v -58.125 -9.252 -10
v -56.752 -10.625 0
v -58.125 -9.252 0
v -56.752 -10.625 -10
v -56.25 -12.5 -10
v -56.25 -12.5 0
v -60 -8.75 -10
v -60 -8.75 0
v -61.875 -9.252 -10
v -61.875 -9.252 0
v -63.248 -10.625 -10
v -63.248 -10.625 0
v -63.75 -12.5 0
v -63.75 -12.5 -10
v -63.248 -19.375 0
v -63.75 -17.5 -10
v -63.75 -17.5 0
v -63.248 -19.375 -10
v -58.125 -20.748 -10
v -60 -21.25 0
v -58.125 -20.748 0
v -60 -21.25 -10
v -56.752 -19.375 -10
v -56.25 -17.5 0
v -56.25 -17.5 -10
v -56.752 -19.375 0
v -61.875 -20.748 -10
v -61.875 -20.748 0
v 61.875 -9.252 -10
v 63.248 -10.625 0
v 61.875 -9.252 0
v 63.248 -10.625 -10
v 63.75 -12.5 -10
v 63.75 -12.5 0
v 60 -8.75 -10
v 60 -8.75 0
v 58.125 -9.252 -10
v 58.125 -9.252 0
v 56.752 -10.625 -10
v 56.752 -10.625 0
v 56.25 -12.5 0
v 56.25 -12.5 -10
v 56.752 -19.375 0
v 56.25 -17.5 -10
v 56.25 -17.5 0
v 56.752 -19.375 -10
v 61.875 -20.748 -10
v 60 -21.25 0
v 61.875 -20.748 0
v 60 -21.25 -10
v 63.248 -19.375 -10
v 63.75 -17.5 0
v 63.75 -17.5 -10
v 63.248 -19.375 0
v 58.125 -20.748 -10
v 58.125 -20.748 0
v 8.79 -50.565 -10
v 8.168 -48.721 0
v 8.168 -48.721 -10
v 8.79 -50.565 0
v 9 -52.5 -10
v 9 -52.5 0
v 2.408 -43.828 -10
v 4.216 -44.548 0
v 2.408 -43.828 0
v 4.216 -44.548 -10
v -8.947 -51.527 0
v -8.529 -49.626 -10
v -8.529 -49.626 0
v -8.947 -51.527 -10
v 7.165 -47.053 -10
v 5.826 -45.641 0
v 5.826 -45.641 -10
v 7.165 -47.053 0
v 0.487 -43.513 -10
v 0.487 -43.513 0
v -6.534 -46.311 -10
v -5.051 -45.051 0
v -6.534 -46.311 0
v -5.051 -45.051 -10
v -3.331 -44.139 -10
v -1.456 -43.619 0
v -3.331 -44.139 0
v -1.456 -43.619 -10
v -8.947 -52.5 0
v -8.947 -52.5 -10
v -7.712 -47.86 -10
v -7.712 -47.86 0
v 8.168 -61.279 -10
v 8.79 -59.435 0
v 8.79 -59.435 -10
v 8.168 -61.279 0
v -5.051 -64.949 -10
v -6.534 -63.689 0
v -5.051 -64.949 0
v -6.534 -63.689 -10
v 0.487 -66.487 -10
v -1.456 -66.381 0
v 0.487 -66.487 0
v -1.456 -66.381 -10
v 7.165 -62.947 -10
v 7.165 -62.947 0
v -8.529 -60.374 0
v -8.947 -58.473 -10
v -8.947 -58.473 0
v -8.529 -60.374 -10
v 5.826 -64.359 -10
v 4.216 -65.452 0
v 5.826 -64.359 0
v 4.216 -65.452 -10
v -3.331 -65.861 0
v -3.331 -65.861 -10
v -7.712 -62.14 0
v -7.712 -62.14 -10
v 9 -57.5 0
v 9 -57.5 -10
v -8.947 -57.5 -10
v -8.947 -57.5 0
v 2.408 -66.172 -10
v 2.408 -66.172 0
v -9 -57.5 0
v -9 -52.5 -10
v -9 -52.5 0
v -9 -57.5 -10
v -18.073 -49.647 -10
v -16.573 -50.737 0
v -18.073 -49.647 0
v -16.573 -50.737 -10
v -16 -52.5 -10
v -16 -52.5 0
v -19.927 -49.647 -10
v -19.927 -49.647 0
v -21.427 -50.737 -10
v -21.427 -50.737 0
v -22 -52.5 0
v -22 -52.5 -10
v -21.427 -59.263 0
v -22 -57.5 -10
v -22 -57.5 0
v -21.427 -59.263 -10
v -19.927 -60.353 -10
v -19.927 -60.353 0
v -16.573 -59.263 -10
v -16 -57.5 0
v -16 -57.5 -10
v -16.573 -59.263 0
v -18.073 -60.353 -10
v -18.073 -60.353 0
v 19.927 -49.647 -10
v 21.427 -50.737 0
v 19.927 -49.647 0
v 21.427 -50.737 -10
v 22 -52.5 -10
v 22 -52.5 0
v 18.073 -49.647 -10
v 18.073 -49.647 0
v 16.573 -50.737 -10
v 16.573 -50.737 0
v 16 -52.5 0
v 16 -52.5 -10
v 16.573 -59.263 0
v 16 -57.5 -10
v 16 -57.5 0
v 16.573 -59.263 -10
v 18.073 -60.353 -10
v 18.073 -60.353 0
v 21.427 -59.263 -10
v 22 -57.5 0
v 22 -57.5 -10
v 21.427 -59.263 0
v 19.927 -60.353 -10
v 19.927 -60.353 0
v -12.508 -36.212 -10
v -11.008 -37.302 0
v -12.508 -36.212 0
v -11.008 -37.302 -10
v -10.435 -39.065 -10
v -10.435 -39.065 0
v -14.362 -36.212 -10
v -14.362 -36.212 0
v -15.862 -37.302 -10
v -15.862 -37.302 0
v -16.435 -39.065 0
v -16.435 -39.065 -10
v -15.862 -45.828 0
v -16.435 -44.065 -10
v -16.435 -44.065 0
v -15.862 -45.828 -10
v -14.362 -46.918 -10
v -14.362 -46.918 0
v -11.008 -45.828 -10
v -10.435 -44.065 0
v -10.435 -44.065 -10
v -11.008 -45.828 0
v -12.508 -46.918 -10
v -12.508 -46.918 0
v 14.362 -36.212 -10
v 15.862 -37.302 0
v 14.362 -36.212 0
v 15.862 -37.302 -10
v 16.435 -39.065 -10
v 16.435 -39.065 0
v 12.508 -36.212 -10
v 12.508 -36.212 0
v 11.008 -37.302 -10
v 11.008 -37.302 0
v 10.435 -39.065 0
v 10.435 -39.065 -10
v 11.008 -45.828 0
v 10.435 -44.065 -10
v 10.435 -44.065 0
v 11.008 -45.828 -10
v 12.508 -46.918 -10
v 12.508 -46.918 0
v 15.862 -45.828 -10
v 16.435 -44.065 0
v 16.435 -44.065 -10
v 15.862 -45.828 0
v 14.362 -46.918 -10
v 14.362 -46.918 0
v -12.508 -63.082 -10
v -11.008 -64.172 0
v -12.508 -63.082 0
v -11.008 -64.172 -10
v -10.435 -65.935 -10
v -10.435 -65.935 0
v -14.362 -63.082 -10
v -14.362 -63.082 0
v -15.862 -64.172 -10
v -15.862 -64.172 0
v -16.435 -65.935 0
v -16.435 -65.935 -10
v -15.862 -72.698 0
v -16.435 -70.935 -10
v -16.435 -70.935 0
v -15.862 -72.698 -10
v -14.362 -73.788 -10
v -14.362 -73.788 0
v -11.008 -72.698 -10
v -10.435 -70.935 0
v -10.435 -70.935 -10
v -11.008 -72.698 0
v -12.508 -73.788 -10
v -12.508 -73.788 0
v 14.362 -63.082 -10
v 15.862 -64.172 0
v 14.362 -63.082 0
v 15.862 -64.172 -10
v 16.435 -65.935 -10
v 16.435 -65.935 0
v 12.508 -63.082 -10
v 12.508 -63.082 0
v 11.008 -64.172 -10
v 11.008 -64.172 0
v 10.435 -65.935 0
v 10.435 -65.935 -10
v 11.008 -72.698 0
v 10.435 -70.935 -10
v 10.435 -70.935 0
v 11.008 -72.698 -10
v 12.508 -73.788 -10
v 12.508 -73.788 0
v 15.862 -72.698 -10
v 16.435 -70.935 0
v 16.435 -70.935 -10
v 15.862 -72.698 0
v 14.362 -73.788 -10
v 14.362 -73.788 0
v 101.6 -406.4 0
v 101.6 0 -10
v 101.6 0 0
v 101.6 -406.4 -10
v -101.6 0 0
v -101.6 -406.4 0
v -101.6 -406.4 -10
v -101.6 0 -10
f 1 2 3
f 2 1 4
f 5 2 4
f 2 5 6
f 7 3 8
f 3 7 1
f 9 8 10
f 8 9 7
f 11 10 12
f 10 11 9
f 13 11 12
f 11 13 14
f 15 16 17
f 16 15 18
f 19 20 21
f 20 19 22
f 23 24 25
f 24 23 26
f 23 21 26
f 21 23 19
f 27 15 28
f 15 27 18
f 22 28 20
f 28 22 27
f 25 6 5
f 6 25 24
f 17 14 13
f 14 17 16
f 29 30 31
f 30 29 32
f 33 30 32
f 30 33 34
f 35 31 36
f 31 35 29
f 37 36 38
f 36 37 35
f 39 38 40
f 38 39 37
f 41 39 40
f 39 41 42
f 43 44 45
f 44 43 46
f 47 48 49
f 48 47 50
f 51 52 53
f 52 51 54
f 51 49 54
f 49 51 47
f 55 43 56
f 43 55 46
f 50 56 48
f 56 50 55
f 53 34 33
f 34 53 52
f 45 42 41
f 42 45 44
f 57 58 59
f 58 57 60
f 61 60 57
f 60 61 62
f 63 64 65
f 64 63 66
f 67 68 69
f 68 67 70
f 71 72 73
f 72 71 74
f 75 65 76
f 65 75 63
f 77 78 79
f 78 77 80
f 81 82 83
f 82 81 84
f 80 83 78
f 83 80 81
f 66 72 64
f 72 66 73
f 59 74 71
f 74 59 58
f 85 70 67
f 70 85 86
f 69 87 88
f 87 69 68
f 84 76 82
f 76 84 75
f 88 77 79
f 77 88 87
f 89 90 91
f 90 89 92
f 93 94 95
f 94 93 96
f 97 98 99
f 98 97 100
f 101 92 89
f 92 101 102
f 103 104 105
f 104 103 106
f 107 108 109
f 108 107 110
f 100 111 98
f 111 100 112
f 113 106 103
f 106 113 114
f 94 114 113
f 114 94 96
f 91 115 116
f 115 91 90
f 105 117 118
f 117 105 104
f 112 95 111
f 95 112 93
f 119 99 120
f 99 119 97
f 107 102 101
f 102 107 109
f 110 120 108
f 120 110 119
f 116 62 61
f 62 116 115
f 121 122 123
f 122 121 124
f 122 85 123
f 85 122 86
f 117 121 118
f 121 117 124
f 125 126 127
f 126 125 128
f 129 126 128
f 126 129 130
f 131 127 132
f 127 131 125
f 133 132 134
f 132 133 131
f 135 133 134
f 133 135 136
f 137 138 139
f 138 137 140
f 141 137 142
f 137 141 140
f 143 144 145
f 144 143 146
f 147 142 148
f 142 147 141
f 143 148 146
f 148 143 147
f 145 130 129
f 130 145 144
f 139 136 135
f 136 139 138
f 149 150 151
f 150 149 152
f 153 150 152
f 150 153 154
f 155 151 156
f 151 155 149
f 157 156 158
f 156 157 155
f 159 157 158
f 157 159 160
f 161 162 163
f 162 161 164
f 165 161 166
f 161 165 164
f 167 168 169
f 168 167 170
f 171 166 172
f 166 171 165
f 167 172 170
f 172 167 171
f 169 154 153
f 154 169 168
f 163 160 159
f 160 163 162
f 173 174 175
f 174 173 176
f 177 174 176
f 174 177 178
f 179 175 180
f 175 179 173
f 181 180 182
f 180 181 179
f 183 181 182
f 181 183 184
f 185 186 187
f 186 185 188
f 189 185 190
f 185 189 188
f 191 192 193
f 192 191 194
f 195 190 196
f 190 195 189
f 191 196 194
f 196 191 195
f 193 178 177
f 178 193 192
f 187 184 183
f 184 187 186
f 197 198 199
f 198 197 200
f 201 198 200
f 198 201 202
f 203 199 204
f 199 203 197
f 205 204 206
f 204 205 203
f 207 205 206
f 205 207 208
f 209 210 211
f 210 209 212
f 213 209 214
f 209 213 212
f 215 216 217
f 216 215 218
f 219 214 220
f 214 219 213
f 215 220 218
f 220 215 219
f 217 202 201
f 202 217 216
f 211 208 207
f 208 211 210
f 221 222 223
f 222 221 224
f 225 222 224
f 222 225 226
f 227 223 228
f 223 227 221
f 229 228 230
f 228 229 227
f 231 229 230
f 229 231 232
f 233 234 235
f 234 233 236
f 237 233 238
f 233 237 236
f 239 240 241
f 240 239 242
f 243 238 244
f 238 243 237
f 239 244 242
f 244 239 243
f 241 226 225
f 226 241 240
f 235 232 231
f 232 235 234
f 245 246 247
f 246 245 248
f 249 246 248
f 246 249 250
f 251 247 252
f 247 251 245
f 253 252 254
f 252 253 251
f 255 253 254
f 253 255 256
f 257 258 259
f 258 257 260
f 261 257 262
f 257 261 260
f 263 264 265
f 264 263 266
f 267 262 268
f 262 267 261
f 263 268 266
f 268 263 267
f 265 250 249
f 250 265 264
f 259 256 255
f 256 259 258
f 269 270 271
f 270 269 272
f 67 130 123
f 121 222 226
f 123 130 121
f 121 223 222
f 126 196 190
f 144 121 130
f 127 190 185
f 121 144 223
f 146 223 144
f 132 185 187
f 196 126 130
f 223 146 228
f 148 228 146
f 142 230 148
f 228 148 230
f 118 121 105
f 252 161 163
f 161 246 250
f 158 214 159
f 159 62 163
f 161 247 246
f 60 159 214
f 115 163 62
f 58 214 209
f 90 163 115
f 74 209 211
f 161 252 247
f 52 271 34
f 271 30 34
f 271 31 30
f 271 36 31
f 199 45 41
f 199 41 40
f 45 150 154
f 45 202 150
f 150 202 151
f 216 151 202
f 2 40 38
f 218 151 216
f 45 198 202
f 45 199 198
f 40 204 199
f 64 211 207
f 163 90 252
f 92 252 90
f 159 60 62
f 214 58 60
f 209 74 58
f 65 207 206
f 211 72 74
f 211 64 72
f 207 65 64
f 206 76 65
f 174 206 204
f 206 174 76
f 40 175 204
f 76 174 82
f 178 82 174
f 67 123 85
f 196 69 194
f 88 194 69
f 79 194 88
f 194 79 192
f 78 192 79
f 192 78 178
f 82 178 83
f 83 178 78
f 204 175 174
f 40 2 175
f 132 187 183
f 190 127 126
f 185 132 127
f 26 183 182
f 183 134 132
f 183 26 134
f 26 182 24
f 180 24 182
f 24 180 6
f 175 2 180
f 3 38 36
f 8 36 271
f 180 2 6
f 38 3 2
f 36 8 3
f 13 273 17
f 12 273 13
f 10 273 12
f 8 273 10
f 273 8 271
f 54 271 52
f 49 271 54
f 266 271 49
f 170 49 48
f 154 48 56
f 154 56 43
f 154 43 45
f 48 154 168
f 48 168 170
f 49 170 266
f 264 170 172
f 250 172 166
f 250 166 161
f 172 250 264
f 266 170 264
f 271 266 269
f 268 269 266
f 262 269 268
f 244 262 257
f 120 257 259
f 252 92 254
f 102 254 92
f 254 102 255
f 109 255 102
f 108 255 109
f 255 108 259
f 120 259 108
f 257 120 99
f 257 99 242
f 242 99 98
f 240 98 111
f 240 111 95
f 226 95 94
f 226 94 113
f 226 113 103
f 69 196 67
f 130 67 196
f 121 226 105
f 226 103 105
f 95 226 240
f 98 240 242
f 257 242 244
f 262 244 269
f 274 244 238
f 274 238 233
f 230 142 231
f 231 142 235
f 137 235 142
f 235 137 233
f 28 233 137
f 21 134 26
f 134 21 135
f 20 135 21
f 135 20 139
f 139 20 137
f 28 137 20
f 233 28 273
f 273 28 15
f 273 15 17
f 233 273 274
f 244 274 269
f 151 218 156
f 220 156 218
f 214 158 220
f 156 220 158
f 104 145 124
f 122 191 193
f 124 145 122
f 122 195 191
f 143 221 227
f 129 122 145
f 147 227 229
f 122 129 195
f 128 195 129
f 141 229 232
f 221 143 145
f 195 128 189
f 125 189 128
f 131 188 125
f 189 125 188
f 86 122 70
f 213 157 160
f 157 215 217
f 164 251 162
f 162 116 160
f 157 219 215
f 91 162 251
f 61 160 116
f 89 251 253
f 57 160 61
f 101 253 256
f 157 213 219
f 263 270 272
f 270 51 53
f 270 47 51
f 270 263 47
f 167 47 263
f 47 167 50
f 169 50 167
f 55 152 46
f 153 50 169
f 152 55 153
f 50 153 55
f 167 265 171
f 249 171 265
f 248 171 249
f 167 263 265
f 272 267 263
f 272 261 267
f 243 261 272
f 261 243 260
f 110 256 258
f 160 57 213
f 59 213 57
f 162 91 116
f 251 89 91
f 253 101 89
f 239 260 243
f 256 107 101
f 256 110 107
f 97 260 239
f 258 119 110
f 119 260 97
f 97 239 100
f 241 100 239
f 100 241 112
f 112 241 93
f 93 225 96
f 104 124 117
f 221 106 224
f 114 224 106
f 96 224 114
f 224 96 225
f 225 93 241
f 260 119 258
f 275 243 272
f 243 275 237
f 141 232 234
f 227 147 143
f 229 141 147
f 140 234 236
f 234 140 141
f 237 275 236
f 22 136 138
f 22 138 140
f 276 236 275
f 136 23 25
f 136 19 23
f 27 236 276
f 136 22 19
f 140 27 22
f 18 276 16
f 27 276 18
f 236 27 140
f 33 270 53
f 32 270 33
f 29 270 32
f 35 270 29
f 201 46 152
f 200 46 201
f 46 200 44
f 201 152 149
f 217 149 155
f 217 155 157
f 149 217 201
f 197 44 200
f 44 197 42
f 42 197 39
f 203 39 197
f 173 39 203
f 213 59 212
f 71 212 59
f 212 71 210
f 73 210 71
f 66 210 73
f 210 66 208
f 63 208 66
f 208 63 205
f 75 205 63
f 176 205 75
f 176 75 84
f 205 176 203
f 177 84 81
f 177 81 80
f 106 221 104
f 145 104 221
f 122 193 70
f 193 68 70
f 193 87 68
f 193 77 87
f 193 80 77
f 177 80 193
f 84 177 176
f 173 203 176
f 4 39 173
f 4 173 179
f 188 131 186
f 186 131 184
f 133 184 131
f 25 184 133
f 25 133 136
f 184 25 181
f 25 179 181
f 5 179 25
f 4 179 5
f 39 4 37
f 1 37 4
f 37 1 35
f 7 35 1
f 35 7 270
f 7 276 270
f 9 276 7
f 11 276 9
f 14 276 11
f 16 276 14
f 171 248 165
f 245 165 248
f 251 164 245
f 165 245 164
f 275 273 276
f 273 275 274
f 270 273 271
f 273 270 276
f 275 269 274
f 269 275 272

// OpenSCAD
tplate = 10;        // quarter inch aluminum plate
xplate = 8*25.4;
yplate = 16*25.4;


// 8020 fixture screw holes with tolerance
tol = 2.5;          // amount of motion allowed in y axis
ds1 = 7.5;          // screw hole diameter
ds2 = 18;           // ball screw diameter

ls1 = 60;           // distance between 8020 mounting screw and middle
prof = 30;          // profile size in mm
bsy = 25;           // distance between profile edge and ball screw

ds3 = 6;            // ballscrew fixing screw diameter
ls2 = 38/2;         // distance to ballscrew fixing screw

difference(){
    //main plate
    translate ([0,-yplate/2,-tplate/2]) cube([xplate,yplate,tplate], center = true);
    
    // left screw
    translate ([-ls1,-prof/2,0]) screwdrill(ds1, tol);
    
    // right screw
    translate ([+ls1,-prof/2,0]) screwdrill(ds1, tol);

    // ballscrew main
    translate ([0,-prof-bsy,0]) screwdrill(ds2, tol);

    // ball screw horizontal screws
    translate ([-ls2,-prof-bsy,0]) screwdrill(ds3, tol);
    translate ([+ls2,-prof-bsy,0]) screwdrill(ds3, tol);
    // ball screw upper screws
    translate ([-ls2*cos(45),+ls2*sin(45),0]) translate ([0,-prof-bsy,0]) screwdrill(ds3, tol);
    translate ([+ls2*cos(45),+ls2*sin(45),0]) translate ([0,-prof-bsy,0]) screwdrill(ds3, tol);
    // ball screw lower screws
    translate ([-ls2*cos(45),-ls2*sin(45),0]) translate ([0,-prof-bsy,0]) screwdrill(ds3, tol);
    translate ([+ls2*cos(45),-ls2*sin(45),0]) translate ([0,-prof-bsy,0]) screwdrill(ds3, tol);
}

module screwdrill(ds, tolr){
    translate ([0,+tolr,0]) cylinder (d=ds, h=100, center=true);
    translate ([0,-tolr,0]) cylinder (d=ds, h=100, center=true);
    cube([ds,2*tolr,100], center=true);
}
